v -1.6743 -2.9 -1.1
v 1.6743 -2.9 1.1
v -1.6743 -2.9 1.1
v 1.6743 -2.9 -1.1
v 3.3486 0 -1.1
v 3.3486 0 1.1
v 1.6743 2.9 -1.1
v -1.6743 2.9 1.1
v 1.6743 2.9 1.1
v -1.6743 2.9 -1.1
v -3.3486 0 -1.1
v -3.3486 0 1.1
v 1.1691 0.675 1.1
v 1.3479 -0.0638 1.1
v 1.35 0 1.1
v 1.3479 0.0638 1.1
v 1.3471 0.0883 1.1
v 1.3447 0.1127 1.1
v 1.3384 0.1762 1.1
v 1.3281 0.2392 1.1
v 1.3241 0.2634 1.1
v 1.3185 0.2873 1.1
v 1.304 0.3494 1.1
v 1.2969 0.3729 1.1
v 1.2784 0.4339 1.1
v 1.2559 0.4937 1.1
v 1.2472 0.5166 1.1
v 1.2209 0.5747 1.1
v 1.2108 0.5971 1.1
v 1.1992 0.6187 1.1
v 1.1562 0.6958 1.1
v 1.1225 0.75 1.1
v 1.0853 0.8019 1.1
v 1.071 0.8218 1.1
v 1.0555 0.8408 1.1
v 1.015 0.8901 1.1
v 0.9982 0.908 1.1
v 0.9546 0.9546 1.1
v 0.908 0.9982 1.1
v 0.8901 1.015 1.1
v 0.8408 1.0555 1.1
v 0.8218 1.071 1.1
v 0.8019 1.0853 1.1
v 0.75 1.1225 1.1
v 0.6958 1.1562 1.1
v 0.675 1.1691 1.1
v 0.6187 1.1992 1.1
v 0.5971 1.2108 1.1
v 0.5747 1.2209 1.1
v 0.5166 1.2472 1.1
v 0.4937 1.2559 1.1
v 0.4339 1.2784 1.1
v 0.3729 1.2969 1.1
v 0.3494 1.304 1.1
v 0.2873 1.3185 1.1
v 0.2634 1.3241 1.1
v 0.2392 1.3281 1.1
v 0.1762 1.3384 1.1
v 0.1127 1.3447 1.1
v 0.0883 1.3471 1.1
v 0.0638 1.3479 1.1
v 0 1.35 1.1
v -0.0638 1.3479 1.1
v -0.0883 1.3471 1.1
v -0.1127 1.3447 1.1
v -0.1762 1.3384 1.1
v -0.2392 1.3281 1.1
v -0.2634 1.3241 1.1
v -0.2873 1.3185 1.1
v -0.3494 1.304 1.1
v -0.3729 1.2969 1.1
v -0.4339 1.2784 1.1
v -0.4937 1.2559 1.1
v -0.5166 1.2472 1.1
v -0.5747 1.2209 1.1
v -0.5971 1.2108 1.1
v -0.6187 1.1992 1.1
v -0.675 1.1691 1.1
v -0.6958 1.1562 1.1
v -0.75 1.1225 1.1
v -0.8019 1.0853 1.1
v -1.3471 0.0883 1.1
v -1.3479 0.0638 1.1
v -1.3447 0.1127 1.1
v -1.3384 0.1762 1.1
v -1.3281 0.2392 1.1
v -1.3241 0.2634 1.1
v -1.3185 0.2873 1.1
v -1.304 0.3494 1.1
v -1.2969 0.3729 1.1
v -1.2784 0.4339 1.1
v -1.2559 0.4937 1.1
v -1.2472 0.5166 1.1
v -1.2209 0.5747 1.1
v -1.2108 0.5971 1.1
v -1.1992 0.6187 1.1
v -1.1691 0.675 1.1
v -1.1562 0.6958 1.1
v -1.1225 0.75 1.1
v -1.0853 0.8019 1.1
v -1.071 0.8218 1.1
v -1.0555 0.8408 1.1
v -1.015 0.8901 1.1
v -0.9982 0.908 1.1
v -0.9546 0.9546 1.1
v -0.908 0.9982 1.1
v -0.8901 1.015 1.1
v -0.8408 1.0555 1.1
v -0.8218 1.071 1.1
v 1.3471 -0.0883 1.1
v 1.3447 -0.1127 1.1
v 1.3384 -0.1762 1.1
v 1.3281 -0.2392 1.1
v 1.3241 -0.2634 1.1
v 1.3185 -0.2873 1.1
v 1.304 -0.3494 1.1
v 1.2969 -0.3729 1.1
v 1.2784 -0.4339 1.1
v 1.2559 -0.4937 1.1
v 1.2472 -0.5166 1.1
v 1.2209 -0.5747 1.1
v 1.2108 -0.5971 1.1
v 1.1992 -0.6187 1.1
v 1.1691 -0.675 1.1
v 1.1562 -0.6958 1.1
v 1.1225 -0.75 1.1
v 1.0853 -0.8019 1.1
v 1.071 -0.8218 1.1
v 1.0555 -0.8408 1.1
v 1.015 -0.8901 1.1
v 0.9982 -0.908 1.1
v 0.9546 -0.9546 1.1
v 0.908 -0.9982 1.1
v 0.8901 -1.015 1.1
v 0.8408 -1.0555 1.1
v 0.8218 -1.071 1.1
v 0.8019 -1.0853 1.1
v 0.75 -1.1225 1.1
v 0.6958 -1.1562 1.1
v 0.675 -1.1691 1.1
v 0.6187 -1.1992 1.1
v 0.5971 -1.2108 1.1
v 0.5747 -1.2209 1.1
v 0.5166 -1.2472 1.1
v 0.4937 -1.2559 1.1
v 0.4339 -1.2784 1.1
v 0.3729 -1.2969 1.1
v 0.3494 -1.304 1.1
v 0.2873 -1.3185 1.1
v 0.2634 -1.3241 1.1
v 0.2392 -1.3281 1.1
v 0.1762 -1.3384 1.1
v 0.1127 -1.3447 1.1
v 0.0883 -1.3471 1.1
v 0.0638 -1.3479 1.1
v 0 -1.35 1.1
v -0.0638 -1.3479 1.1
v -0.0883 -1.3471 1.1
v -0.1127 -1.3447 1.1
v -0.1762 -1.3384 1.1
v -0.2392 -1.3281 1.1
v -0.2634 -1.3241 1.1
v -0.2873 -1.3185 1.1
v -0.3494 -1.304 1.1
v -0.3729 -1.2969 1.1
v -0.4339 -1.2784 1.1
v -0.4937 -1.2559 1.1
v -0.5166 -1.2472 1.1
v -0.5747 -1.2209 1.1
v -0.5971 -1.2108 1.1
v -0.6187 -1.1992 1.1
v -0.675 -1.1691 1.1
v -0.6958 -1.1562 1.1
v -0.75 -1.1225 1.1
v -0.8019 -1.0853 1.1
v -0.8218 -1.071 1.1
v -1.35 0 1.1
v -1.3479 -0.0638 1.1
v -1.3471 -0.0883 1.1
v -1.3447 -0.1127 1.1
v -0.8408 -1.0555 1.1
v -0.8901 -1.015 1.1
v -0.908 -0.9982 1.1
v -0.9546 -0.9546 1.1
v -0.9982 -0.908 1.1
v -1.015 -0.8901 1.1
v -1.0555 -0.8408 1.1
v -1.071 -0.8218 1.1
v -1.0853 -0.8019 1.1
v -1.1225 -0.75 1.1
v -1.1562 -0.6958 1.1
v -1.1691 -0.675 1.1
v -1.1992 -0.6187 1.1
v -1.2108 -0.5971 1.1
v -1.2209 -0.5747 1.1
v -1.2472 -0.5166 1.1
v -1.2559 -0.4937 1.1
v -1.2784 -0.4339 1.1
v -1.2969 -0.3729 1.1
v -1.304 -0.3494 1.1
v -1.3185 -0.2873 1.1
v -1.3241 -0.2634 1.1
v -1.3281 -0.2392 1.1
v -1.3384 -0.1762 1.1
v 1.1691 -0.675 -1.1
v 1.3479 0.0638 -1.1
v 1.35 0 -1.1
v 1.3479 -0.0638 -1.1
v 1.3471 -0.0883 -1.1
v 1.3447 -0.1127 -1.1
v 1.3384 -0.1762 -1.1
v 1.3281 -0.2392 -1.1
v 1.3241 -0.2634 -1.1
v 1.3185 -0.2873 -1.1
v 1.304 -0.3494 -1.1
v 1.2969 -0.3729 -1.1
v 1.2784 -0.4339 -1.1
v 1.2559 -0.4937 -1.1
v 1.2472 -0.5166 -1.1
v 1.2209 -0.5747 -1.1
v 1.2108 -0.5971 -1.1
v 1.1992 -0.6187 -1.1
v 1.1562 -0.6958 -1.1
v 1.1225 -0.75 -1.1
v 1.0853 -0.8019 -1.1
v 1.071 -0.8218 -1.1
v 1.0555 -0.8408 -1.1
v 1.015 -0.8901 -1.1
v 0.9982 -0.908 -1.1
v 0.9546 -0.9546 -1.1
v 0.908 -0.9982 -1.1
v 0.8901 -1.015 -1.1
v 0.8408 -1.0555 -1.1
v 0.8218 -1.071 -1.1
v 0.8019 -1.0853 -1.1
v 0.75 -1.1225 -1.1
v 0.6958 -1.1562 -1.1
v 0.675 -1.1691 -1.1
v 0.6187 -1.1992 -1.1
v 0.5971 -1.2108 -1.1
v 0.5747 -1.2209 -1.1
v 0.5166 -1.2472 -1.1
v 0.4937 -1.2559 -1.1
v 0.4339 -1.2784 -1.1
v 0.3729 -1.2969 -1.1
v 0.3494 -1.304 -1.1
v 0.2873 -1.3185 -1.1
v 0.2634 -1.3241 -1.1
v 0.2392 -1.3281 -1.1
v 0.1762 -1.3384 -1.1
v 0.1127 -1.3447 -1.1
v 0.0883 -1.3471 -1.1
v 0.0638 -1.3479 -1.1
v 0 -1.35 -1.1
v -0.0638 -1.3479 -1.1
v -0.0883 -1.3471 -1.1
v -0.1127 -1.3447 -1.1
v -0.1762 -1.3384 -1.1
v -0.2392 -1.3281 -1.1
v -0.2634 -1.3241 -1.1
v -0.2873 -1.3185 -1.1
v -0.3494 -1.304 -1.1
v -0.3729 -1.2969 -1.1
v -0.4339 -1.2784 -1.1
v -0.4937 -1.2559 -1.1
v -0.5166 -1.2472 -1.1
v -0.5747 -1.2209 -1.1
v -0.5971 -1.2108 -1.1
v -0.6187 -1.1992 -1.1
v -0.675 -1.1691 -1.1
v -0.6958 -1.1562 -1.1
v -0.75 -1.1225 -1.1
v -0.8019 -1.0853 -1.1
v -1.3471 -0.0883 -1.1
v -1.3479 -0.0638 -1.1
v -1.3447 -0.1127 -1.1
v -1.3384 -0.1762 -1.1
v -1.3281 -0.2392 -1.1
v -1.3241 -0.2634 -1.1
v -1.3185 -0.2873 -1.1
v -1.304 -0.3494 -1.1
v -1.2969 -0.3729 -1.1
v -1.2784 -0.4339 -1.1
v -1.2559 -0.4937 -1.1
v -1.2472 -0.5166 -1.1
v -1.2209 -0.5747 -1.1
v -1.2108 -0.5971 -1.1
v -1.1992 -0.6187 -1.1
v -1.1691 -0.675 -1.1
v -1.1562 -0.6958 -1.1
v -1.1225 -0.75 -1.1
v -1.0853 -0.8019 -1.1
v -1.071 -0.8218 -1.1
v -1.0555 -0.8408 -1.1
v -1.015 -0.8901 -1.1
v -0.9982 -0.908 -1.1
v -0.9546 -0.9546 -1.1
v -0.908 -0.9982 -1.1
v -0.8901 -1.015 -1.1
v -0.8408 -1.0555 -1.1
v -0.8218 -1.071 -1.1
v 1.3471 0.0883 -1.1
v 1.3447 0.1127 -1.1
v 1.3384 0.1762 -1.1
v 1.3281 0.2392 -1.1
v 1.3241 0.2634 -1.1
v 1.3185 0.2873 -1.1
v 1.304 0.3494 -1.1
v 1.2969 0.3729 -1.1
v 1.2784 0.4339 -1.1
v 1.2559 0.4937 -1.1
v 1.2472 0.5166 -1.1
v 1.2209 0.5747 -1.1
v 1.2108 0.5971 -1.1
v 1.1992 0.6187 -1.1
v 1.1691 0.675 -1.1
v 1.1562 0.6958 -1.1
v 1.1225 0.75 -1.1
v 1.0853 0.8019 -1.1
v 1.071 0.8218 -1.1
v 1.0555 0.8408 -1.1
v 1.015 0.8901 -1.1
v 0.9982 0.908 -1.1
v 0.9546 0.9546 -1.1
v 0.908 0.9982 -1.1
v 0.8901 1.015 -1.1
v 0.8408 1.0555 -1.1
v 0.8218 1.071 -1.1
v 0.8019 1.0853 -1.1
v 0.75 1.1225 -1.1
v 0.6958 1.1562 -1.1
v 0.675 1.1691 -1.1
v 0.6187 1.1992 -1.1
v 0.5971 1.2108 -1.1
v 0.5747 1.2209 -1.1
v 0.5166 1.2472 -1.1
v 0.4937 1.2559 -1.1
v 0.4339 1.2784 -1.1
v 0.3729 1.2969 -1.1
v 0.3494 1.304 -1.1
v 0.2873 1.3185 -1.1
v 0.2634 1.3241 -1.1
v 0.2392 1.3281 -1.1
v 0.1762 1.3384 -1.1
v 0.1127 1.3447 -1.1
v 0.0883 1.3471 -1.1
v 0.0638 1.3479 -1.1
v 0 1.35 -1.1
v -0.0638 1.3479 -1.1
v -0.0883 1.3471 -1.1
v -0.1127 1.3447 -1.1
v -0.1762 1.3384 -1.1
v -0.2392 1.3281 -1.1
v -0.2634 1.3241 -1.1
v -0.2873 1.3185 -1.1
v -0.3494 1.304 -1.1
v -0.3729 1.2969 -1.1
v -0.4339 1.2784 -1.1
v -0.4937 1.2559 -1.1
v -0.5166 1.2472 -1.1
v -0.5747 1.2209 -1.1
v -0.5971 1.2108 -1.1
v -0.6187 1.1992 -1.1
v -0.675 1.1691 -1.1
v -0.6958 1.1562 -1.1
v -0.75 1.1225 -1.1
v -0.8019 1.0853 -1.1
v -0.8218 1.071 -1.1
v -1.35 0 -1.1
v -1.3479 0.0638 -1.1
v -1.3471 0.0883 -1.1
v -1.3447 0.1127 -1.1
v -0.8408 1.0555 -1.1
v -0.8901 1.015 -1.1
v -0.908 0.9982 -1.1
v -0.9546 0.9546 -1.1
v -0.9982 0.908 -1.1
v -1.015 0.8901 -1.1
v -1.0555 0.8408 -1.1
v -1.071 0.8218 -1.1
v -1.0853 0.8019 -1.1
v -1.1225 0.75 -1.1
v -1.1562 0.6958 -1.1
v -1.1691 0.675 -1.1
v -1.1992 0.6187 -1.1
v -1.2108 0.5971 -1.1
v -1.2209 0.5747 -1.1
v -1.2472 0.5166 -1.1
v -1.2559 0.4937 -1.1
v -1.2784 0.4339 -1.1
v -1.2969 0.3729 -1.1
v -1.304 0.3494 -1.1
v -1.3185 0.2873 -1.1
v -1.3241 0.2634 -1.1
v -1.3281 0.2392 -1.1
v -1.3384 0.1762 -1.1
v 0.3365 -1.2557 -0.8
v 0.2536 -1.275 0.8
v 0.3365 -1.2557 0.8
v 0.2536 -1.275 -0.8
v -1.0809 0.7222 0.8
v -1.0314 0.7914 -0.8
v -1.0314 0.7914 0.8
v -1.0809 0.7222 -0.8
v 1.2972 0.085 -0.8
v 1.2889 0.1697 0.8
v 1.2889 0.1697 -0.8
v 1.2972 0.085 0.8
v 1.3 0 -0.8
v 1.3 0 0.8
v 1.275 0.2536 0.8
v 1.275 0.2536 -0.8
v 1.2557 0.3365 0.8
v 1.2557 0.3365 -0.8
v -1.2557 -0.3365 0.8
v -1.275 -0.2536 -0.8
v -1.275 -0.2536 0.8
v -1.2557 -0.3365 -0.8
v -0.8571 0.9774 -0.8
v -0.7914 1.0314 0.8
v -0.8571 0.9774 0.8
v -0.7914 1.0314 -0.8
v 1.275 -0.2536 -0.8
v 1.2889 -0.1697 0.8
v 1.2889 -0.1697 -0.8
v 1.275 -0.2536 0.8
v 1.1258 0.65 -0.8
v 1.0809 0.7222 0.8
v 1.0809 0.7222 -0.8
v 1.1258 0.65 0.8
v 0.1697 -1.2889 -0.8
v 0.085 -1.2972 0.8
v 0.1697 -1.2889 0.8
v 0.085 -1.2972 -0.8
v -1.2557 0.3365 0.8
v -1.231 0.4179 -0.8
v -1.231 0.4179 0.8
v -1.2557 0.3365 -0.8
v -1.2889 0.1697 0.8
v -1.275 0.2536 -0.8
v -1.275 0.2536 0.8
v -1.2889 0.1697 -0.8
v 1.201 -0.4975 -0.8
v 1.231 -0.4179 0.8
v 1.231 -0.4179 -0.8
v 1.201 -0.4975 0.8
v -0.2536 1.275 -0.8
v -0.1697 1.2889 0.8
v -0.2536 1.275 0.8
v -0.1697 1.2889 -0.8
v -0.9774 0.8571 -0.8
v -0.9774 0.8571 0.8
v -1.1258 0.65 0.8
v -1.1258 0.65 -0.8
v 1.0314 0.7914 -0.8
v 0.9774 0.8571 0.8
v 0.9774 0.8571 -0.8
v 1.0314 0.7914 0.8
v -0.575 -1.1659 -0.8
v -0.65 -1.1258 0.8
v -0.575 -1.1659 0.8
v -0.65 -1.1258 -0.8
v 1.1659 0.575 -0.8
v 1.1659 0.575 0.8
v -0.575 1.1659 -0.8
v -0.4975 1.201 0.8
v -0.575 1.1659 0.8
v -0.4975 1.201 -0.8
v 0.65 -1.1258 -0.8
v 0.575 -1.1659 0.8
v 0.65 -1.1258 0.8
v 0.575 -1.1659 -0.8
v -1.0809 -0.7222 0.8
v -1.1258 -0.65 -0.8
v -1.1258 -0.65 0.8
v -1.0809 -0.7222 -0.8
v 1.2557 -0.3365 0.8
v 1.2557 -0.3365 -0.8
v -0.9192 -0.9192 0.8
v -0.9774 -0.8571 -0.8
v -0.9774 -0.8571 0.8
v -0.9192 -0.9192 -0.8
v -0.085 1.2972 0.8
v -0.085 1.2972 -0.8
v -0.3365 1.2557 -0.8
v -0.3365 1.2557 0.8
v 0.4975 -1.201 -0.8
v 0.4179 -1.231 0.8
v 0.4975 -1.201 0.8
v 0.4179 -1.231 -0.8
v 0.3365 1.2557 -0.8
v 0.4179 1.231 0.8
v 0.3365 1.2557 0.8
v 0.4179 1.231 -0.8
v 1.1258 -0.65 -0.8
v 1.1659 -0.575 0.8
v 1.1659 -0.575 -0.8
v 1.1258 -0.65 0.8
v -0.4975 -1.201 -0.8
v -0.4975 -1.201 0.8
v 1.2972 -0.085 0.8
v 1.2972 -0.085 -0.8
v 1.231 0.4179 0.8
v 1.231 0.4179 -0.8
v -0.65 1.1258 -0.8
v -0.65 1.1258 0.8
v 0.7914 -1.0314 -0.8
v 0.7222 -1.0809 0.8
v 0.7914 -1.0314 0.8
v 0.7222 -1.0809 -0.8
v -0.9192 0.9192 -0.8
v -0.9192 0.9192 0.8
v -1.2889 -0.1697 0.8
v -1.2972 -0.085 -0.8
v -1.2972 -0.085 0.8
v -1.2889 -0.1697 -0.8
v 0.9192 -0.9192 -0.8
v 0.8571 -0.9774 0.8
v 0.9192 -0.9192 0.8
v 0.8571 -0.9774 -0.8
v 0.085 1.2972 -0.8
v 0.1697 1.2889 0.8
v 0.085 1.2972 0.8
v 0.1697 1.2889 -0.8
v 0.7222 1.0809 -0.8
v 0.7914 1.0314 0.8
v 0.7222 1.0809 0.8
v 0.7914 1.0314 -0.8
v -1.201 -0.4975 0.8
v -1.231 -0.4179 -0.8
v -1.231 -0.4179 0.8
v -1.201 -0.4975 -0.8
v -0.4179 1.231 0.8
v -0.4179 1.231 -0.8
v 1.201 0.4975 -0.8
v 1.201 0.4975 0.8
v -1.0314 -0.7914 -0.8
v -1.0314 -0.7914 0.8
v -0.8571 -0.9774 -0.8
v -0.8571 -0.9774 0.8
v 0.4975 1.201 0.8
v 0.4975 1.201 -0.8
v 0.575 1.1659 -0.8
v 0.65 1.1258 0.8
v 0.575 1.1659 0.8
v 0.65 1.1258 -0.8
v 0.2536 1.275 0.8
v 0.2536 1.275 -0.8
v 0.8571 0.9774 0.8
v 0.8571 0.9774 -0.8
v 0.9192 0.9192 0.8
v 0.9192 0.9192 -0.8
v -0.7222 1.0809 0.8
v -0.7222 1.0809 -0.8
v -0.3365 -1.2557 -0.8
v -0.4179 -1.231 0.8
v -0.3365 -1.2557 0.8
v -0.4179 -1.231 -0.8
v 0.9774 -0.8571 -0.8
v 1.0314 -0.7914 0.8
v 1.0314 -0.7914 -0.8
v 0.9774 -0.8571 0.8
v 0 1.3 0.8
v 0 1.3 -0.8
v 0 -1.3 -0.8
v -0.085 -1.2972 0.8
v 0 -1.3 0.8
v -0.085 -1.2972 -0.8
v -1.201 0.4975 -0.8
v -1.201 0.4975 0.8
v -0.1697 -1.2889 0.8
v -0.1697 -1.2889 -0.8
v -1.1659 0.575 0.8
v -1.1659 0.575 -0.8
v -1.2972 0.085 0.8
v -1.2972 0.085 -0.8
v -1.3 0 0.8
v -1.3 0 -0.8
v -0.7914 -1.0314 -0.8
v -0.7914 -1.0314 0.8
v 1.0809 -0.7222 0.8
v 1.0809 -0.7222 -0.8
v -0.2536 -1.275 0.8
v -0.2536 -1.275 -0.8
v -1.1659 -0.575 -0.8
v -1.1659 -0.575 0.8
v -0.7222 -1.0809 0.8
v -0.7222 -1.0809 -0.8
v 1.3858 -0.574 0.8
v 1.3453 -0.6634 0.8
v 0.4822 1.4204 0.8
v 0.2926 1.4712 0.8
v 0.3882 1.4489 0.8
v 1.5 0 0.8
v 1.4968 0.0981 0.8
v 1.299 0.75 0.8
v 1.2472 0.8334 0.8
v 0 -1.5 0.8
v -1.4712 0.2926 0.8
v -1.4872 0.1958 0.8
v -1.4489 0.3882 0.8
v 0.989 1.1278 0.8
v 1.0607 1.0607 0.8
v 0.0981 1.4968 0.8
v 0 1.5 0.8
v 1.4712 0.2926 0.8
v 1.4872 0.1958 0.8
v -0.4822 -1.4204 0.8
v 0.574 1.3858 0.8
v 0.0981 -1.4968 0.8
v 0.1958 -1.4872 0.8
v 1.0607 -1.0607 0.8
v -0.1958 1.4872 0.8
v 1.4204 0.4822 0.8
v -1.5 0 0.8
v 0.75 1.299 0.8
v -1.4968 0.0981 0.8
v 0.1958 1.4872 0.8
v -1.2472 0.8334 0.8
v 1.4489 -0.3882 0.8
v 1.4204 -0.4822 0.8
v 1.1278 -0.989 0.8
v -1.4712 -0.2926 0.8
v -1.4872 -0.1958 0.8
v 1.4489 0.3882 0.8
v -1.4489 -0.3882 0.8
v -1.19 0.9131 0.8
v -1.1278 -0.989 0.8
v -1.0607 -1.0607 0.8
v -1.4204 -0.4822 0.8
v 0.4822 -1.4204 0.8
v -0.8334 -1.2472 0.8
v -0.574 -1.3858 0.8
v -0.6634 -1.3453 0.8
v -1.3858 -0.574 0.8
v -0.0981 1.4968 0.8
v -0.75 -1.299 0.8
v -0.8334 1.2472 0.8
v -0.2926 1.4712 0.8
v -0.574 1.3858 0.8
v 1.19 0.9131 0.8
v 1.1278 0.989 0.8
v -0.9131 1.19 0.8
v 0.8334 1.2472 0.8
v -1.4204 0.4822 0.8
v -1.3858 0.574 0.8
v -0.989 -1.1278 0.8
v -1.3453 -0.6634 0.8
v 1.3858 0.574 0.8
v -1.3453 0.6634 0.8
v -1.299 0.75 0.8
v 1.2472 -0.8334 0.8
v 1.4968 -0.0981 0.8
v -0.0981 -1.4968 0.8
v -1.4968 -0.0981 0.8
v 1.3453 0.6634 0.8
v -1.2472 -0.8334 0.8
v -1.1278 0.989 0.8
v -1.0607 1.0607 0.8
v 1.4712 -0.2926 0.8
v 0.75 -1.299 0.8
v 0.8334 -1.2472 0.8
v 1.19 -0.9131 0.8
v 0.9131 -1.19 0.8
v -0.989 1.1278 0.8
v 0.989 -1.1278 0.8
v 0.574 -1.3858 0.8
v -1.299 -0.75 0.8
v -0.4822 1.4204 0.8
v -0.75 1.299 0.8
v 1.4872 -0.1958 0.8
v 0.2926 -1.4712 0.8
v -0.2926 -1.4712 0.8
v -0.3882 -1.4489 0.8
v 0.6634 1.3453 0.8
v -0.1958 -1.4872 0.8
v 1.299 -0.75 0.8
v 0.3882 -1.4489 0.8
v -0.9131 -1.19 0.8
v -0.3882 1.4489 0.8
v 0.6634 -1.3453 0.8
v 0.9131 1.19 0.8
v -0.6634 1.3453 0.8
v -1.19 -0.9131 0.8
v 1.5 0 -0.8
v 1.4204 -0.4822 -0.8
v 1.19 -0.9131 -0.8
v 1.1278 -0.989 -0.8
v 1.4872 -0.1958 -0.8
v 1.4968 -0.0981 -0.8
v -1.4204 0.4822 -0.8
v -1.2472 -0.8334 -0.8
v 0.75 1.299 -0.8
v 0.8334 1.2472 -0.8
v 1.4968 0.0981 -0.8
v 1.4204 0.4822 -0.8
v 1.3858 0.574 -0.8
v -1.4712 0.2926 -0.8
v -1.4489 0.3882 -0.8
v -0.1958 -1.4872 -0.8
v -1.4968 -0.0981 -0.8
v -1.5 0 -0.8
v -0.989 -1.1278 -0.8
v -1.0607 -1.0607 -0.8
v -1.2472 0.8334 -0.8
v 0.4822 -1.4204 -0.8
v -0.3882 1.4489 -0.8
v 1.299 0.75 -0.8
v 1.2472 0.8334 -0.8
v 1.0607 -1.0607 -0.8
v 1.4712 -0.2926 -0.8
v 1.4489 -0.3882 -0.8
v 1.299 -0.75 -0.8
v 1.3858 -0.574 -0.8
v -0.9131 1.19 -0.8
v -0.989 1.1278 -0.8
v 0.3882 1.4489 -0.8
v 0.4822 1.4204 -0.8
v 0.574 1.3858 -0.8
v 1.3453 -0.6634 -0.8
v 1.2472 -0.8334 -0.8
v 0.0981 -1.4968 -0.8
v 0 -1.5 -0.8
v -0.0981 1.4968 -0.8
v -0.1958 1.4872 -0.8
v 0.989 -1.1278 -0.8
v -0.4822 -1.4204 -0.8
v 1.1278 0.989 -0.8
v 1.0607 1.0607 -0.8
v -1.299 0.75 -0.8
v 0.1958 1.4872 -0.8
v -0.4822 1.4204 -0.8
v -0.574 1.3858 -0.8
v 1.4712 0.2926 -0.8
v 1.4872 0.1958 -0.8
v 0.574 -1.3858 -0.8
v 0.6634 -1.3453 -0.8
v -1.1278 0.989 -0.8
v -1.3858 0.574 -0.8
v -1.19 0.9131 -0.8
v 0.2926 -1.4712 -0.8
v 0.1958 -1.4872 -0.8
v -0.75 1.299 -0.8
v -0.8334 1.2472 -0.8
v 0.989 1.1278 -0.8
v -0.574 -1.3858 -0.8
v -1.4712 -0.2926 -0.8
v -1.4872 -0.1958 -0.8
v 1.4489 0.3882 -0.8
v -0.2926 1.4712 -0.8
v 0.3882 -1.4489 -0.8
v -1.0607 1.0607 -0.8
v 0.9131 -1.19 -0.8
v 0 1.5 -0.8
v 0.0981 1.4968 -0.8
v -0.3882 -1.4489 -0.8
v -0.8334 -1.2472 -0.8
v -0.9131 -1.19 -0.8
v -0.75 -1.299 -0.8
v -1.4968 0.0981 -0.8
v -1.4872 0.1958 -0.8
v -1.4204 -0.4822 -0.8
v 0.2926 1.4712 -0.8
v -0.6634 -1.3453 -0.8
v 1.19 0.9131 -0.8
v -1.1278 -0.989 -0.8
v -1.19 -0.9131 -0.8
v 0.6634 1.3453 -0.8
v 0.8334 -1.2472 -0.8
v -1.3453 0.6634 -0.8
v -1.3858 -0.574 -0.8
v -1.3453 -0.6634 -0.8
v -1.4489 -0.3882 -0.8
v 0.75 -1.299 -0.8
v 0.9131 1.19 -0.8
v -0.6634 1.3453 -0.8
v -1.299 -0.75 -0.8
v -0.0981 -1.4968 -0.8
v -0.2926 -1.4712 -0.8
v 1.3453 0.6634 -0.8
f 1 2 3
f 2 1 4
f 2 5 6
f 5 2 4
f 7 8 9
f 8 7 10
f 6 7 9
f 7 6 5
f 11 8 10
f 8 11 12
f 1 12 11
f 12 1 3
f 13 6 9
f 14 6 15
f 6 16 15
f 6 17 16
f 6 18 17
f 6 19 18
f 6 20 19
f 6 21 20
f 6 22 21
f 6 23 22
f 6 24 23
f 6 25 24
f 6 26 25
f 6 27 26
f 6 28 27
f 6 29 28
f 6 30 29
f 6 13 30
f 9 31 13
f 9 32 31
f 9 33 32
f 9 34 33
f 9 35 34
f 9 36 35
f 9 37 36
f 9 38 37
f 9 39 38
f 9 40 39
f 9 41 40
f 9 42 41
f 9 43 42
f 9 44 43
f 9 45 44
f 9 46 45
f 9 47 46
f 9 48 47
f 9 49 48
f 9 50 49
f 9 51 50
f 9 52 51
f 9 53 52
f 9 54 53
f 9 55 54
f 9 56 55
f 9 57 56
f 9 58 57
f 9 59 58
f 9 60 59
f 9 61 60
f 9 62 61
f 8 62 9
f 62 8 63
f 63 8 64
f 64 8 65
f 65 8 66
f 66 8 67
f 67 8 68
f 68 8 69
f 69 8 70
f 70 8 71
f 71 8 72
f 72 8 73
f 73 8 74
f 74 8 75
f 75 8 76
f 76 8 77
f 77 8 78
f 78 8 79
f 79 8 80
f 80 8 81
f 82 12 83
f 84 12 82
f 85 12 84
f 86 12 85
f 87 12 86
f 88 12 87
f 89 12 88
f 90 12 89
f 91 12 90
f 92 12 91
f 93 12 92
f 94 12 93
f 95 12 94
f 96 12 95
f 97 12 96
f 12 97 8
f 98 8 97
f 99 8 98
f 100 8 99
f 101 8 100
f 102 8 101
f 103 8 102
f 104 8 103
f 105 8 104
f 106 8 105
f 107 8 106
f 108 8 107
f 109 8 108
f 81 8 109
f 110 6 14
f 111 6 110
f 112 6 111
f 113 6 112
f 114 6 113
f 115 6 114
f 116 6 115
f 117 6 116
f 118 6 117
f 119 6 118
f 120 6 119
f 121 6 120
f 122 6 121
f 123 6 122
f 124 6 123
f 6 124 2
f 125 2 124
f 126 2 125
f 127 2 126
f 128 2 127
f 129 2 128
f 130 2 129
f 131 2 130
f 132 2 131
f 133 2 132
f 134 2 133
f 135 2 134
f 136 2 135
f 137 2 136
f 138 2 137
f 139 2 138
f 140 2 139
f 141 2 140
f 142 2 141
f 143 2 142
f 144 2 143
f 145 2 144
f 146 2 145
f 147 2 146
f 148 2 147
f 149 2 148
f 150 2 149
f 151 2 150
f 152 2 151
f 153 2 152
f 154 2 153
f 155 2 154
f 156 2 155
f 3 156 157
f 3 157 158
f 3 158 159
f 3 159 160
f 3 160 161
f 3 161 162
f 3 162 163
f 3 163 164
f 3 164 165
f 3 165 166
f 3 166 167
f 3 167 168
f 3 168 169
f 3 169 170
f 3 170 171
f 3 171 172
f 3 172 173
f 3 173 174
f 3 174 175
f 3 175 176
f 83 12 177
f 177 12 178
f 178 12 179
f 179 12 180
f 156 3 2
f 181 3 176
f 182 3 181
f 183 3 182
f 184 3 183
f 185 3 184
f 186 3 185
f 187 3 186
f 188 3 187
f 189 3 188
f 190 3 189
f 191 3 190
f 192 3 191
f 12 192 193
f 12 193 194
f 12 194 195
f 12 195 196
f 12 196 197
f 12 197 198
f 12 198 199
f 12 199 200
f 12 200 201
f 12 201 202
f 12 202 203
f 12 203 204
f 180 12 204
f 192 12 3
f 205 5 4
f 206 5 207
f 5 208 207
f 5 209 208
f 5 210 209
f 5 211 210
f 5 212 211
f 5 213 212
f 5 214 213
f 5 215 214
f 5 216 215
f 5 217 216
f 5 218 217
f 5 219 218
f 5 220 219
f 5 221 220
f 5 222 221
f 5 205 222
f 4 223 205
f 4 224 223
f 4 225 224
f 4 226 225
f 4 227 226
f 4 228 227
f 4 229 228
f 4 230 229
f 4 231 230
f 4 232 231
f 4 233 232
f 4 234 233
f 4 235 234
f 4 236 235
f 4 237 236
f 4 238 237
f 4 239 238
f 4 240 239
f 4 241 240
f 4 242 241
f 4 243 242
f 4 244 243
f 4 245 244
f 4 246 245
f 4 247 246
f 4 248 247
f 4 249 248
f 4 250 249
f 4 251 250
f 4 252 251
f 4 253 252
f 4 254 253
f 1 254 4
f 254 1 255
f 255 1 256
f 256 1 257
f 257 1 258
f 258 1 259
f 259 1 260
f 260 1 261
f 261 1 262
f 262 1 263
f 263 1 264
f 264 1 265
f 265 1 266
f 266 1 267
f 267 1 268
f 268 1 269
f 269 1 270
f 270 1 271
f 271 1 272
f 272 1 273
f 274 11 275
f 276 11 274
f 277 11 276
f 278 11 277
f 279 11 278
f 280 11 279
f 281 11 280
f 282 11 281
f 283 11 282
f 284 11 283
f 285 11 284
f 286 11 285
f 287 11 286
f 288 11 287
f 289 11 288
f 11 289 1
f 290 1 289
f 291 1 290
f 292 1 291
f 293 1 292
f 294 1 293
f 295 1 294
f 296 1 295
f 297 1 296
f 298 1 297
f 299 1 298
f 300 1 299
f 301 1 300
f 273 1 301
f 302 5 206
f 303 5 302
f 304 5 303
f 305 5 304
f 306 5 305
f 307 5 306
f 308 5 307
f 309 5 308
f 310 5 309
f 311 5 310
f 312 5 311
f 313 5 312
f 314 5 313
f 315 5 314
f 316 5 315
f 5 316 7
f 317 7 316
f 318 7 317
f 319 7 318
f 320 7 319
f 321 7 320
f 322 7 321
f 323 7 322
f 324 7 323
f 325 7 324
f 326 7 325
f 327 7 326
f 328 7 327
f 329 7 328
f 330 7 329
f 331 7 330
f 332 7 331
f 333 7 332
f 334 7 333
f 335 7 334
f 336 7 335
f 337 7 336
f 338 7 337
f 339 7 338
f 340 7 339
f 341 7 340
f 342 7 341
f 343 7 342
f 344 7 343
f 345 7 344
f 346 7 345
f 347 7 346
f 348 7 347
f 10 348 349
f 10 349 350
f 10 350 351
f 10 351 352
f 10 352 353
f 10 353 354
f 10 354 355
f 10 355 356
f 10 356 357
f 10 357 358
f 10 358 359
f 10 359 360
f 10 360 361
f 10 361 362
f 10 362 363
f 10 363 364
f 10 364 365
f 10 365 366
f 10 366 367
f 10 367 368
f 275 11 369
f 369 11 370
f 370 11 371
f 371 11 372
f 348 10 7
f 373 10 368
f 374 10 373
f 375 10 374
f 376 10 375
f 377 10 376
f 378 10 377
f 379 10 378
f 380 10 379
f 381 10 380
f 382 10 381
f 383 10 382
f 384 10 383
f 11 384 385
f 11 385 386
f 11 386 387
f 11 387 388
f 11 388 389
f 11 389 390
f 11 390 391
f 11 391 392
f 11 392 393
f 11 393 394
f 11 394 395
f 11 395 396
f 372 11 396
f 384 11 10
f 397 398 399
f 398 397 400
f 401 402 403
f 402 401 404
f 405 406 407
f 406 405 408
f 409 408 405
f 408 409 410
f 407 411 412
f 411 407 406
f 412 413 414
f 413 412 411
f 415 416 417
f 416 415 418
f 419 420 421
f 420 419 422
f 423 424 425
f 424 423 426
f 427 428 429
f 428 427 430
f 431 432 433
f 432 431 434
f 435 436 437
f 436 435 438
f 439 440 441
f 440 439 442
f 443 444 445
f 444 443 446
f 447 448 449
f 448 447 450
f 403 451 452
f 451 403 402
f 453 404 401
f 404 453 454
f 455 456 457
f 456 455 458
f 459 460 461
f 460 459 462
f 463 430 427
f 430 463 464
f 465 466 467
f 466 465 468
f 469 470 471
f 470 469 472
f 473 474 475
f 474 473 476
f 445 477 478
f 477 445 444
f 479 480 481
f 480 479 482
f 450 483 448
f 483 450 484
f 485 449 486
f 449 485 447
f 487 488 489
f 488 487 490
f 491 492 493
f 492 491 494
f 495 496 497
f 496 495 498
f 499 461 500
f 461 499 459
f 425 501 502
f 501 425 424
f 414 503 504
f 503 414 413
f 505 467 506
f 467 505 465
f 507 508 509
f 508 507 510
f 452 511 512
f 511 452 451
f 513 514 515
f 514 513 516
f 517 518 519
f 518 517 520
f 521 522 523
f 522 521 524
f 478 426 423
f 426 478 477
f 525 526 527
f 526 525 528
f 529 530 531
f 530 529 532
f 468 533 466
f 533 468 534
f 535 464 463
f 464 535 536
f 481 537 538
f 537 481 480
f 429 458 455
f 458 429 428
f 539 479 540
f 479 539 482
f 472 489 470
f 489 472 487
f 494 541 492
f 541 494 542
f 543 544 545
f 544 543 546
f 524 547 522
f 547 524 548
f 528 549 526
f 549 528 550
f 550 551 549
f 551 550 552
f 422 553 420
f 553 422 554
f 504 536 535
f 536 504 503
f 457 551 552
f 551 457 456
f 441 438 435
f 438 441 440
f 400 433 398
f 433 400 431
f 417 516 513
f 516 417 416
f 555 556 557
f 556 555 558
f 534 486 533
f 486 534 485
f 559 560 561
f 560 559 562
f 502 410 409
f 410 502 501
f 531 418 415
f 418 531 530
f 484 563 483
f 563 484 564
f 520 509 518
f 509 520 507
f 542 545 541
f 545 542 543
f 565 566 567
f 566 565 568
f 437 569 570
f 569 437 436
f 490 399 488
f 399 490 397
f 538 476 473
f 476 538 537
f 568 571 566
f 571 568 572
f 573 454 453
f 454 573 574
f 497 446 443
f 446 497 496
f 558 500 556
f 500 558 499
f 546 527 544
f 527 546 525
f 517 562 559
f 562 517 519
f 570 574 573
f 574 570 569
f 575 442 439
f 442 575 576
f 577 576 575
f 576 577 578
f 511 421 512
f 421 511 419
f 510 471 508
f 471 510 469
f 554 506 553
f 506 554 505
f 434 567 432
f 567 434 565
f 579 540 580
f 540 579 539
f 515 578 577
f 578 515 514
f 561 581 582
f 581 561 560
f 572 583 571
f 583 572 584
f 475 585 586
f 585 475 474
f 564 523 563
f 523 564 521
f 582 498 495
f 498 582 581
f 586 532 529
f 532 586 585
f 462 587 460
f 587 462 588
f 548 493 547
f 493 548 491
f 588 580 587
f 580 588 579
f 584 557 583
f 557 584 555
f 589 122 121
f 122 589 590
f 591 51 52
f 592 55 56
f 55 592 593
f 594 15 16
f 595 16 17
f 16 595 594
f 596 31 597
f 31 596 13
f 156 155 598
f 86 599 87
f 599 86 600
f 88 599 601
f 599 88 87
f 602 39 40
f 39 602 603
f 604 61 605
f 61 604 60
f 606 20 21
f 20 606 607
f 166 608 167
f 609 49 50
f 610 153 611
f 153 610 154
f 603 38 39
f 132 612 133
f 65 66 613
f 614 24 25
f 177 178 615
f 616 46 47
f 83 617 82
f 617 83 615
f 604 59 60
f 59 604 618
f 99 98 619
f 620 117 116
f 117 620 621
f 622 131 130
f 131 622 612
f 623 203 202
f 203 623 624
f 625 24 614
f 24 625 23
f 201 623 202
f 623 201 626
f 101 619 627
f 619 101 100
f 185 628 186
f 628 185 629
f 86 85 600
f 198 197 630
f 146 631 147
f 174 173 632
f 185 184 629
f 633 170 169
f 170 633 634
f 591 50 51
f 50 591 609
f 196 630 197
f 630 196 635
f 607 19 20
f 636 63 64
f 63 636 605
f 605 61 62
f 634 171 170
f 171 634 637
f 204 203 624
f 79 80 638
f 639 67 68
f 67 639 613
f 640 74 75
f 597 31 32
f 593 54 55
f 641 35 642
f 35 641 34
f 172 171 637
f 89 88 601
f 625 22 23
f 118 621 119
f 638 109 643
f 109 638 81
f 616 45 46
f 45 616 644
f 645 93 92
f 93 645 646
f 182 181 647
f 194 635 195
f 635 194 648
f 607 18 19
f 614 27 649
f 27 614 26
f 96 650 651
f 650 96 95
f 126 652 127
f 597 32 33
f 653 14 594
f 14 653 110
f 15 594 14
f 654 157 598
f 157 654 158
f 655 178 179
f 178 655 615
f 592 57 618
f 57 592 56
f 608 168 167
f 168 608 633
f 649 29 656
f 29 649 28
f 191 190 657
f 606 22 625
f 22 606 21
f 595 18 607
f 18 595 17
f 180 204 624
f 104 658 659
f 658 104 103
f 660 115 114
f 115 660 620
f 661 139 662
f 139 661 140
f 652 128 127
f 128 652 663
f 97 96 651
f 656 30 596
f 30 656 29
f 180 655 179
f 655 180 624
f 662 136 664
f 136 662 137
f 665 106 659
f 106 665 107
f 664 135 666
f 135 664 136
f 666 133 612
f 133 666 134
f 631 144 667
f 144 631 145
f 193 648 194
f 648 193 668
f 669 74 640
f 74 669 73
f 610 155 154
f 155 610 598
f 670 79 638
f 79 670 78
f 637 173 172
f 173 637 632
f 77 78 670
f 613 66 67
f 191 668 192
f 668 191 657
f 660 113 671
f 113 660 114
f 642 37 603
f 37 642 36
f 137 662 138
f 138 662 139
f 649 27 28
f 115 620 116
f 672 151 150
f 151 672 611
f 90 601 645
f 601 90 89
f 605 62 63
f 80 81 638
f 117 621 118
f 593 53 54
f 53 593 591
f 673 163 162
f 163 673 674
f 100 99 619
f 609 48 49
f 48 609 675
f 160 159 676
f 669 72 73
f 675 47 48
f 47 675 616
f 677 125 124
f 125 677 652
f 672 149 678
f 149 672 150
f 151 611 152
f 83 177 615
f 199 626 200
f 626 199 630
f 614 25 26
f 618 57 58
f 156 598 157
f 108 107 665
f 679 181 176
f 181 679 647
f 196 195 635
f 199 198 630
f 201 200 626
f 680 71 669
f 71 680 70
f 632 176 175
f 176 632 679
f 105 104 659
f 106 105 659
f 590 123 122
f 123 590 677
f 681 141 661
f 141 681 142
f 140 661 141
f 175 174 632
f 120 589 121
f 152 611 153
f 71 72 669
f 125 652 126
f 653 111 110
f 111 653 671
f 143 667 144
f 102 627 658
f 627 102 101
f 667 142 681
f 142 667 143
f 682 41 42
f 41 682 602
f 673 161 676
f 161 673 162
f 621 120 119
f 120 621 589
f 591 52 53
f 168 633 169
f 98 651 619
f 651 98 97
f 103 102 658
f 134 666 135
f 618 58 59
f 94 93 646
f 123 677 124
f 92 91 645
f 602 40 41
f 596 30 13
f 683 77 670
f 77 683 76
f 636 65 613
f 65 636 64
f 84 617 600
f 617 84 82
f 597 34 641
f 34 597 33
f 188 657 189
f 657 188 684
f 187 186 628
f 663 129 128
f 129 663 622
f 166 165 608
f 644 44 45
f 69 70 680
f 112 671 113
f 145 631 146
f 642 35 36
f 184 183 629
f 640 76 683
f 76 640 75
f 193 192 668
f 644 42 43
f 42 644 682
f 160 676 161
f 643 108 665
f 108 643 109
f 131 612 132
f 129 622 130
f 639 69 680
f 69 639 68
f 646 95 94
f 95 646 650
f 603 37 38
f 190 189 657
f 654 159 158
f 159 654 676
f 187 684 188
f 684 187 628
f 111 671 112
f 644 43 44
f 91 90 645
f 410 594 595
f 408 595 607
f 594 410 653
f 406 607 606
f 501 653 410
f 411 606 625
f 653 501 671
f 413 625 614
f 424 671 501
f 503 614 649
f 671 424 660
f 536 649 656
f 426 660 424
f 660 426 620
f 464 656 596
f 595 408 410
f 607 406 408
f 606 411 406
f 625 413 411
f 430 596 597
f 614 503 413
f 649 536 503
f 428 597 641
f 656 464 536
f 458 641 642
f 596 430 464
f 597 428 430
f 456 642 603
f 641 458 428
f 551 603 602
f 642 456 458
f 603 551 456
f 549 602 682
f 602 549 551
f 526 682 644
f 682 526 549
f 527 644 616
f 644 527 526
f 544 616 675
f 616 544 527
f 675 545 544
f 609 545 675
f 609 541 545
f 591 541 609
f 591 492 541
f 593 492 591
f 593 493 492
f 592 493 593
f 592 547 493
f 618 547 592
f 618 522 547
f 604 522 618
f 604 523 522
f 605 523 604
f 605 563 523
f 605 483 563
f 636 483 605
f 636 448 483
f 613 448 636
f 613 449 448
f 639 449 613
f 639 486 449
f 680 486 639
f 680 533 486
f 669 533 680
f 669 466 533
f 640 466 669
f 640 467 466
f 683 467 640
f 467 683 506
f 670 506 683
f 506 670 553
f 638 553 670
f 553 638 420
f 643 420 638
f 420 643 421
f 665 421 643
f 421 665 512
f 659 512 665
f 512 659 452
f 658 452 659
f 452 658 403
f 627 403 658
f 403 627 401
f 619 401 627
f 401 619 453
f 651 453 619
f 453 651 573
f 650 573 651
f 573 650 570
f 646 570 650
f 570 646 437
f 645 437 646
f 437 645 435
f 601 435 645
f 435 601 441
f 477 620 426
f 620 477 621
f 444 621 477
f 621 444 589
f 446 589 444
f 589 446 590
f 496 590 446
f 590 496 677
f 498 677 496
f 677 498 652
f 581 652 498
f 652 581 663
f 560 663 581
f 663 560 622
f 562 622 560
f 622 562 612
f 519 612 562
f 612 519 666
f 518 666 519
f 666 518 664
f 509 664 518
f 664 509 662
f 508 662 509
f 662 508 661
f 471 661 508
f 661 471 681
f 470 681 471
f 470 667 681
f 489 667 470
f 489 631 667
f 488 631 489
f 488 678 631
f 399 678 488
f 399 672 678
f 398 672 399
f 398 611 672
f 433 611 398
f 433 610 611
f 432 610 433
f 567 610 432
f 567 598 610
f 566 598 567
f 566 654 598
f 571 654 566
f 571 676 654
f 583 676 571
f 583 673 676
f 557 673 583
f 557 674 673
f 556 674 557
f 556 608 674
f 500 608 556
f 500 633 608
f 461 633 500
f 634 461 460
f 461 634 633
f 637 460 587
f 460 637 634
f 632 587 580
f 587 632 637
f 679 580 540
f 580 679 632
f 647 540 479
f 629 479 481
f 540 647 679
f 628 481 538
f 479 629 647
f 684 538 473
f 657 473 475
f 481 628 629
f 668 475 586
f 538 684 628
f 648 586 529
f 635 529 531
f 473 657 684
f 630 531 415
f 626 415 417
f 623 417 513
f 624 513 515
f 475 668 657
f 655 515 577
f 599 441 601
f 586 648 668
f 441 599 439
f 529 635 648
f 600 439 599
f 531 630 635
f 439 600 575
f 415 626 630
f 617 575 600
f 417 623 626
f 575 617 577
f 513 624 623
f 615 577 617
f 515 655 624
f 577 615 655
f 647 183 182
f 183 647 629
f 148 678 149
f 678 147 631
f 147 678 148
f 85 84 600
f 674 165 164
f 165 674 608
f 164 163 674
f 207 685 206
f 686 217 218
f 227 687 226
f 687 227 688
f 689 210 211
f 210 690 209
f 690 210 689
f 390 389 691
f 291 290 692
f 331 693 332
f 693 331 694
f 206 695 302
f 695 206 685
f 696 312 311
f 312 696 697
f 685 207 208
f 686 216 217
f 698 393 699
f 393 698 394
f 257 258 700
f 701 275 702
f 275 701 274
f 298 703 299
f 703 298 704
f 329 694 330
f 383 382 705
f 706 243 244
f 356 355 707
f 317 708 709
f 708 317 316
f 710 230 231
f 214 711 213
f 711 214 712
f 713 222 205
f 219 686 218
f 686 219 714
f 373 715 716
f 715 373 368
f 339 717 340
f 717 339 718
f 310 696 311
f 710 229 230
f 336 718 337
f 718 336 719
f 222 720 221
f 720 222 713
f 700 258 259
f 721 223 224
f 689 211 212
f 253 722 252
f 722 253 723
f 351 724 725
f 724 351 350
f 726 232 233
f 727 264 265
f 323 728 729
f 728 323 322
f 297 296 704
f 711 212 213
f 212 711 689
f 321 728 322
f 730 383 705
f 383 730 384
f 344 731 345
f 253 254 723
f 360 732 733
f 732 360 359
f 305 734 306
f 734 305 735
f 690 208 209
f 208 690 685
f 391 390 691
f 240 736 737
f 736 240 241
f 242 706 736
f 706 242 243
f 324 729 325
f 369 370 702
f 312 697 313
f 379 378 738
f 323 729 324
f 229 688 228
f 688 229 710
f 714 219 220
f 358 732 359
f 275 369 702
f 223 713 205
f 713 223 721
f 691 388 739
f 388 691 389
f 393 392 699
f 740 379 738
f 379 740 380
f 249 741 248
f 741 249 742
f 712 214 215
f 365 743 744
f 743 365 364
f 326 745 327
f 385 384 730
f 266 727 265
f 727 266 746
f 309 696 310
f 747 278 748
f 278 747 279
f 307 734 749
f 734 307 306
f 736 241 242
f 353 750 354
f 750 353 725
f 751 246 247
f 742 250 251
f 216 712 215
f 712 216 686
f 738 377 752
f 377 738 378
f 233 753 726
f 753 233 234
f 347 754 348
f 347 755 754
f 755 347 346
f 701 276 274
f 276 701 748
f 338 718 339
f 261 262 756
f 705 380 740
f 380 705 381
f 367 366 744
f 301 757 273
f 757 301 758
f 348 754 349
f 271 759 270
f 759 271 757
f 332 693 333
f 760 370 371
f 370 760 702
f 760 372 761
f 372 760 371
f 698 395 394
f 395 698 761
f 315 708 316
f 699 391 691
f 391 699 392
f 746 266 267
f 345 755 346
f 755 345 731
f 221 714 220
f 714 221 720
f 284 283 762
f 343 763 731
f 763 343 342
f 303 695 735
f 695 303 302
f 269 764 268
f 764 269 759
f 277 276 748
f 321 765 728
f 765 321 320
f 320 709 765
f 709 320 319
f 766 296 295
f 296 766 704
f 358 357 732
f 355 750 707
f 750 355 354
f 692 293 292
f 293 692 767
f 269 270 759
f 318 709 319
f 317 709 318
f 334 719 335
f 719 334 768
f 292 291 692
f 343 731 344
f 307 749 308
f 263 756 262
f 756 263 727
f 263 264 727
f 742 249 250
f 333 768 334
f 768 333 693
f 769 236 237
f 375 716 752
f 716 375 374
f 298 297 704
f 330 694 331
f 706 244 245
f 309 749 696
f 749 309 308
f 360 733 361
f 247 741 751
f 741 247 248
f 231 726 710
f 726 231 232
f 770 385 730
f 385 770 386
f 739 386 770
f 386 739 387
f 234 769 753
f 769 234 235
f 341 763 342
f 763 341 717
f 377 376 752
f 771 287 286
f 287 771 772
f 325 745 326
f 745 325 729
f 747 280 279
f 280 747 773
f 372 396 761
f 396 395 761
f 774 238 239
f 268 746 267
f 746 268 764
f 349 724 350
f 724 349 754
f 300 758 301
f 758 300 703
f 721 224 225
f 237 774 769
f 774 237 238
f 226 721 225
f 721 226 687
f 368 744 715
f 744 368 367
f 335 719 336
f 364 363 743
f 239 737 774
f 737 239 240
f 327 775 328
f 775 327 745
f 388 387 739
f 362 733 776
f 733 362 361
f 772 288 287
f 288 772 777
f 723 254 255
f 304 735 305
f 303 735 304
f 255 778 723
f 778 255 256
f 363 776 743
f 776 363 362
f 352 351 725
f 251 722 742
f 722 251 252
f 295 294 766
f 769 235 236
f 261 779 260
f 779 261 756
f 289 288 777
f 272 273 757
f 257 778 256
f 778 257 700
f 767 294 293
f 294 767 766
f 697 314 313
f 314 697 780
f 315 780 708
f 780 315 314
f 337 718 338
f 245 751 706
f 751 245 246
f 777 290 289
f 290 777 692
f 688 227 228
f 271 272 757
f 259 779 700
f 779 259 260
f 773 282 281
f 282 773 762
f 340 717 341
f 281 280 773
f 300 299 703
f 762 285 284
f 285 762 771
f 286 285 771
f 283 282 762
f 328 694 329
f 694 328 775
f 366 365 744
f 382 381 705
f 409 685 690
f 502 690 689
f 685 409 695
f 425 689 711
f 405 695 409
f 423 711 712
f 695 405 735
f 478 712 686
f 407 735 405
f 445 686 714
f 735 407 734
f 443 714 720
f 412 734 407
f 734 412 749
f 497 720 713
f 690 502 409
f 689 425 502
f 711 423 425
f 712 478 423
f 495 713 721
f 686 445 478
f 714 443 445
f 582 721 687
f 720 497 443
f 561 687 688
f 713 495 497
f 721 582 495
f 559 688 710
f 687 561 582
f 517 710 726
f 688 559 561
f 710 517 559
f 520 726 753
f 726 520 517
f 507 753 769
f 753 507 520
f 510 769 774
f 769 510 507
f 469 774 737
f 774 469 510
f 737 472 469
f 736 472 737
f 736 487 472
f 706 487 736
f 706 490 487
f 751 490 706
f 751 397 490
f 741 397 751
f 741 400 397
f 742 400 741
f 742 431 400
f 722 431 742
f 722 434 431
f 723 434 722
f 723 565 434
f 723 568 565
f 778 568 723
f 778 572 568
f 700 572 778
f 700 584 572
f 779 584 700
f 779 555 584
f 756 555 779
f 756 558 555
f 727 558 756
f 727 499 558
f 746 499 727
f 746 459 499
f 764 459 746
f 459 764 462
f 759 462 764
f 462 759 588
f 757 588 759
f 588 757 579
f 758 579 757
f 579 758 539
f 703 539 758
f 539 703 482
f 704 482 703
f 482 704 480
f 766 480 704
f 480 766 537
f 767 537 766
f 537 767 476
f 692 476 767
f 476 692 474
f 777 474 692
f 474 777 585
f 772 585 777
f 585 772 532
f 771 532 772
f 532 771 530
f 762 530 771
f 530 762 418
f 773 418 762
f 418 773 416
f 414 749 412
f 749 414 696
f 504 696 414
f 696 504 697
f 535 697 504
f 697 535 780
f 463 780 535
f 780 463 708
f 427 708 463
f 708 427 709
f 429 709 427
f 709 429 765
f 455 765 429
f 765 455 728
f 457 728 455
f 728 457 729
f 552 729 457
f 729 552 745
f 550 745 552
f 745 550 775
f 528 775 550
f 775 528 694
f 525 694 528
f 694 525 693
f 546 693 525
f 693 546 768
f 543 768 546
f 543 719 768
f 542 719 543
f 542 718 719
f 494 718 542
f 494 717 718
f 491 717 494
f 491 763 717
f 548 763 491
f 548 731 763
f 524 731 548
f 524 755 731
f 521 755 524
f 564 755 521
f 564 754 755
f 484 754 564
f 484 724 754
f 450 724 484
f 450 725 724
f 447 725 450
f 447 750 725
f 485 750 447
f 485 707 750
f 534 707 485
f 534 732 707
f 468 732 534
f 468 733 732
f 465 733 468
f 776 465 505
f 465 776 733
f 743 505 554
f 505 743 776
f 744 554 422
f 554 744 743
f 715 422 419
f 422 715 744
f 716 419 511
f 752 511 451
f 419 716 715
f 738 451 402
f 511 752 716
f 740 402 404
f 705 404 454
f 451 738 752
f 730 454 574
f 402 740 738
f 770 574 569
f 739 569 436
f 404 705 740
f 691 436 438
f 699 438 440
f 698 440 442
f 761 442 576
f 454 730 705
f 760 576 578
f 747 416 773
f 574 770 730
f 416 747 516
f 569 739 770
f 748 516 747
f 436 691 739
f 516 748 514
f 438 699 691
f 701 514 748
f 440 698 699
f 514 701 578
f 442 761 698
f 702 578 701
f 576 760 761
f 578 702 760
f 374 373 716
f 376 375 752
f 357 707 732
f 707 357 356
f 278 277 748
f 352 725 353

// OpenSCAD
// Hex nut for M2.5
thread_nominal_diameter_mm = 2.5;
across_flats_mm = 5.8;
thickness_mm = 2.2;

// Printing/fit
tolerance_mm = 0.10;     // added to hole diameter
edge_chamfer_mm = 0.20;  // lead-in chamfer height
overlap_mm = 0.20;       // boolean overlap to avoid artifacts

// Derived
hex_circumradius_mm = across_flats_mm / sqrt(3); // R such that across-flats = sqrt(3)*R
hole_r_mm = (thread_nominal_diameter_mm + tolerance_mm) / 2;

module hex_nut() {
    difference() {
        // Clean hex body (flat-to-flat = across_flats_mm)
        cylinder(r = hex_circumradius_mm, h = thickness_mm, center = true, $fn = 6);

        // Circular through-hole
        cylinder(r = hole_r_mm, h = thickness_mm + 2*overlap_mm, center = true, $fn = 96);

        // Lead-in chamfers (top and bottom), kept within thickness
        translate([0, 0,  thickness_mm/2 - edge_chamfer_mm/2])
            cylinder(r1 = hole_r_mm + edge_chamfer_mm, r2 = hole_r_mm,
                     h = edge_chamfer_mm + overlap_mm, center = true, $fn = 96);

        translate([0, 0, -thickness_mm/2 + edge_chamfer_mm/2])
            cylinder(r1 = hole_r_mm, r2 = hole_r_mm + edge_chamfer_mm,
                     h = edge_chamfer_mm + overlap_mm, center = true, $fn = 96);
    }
}

hex_nut();
